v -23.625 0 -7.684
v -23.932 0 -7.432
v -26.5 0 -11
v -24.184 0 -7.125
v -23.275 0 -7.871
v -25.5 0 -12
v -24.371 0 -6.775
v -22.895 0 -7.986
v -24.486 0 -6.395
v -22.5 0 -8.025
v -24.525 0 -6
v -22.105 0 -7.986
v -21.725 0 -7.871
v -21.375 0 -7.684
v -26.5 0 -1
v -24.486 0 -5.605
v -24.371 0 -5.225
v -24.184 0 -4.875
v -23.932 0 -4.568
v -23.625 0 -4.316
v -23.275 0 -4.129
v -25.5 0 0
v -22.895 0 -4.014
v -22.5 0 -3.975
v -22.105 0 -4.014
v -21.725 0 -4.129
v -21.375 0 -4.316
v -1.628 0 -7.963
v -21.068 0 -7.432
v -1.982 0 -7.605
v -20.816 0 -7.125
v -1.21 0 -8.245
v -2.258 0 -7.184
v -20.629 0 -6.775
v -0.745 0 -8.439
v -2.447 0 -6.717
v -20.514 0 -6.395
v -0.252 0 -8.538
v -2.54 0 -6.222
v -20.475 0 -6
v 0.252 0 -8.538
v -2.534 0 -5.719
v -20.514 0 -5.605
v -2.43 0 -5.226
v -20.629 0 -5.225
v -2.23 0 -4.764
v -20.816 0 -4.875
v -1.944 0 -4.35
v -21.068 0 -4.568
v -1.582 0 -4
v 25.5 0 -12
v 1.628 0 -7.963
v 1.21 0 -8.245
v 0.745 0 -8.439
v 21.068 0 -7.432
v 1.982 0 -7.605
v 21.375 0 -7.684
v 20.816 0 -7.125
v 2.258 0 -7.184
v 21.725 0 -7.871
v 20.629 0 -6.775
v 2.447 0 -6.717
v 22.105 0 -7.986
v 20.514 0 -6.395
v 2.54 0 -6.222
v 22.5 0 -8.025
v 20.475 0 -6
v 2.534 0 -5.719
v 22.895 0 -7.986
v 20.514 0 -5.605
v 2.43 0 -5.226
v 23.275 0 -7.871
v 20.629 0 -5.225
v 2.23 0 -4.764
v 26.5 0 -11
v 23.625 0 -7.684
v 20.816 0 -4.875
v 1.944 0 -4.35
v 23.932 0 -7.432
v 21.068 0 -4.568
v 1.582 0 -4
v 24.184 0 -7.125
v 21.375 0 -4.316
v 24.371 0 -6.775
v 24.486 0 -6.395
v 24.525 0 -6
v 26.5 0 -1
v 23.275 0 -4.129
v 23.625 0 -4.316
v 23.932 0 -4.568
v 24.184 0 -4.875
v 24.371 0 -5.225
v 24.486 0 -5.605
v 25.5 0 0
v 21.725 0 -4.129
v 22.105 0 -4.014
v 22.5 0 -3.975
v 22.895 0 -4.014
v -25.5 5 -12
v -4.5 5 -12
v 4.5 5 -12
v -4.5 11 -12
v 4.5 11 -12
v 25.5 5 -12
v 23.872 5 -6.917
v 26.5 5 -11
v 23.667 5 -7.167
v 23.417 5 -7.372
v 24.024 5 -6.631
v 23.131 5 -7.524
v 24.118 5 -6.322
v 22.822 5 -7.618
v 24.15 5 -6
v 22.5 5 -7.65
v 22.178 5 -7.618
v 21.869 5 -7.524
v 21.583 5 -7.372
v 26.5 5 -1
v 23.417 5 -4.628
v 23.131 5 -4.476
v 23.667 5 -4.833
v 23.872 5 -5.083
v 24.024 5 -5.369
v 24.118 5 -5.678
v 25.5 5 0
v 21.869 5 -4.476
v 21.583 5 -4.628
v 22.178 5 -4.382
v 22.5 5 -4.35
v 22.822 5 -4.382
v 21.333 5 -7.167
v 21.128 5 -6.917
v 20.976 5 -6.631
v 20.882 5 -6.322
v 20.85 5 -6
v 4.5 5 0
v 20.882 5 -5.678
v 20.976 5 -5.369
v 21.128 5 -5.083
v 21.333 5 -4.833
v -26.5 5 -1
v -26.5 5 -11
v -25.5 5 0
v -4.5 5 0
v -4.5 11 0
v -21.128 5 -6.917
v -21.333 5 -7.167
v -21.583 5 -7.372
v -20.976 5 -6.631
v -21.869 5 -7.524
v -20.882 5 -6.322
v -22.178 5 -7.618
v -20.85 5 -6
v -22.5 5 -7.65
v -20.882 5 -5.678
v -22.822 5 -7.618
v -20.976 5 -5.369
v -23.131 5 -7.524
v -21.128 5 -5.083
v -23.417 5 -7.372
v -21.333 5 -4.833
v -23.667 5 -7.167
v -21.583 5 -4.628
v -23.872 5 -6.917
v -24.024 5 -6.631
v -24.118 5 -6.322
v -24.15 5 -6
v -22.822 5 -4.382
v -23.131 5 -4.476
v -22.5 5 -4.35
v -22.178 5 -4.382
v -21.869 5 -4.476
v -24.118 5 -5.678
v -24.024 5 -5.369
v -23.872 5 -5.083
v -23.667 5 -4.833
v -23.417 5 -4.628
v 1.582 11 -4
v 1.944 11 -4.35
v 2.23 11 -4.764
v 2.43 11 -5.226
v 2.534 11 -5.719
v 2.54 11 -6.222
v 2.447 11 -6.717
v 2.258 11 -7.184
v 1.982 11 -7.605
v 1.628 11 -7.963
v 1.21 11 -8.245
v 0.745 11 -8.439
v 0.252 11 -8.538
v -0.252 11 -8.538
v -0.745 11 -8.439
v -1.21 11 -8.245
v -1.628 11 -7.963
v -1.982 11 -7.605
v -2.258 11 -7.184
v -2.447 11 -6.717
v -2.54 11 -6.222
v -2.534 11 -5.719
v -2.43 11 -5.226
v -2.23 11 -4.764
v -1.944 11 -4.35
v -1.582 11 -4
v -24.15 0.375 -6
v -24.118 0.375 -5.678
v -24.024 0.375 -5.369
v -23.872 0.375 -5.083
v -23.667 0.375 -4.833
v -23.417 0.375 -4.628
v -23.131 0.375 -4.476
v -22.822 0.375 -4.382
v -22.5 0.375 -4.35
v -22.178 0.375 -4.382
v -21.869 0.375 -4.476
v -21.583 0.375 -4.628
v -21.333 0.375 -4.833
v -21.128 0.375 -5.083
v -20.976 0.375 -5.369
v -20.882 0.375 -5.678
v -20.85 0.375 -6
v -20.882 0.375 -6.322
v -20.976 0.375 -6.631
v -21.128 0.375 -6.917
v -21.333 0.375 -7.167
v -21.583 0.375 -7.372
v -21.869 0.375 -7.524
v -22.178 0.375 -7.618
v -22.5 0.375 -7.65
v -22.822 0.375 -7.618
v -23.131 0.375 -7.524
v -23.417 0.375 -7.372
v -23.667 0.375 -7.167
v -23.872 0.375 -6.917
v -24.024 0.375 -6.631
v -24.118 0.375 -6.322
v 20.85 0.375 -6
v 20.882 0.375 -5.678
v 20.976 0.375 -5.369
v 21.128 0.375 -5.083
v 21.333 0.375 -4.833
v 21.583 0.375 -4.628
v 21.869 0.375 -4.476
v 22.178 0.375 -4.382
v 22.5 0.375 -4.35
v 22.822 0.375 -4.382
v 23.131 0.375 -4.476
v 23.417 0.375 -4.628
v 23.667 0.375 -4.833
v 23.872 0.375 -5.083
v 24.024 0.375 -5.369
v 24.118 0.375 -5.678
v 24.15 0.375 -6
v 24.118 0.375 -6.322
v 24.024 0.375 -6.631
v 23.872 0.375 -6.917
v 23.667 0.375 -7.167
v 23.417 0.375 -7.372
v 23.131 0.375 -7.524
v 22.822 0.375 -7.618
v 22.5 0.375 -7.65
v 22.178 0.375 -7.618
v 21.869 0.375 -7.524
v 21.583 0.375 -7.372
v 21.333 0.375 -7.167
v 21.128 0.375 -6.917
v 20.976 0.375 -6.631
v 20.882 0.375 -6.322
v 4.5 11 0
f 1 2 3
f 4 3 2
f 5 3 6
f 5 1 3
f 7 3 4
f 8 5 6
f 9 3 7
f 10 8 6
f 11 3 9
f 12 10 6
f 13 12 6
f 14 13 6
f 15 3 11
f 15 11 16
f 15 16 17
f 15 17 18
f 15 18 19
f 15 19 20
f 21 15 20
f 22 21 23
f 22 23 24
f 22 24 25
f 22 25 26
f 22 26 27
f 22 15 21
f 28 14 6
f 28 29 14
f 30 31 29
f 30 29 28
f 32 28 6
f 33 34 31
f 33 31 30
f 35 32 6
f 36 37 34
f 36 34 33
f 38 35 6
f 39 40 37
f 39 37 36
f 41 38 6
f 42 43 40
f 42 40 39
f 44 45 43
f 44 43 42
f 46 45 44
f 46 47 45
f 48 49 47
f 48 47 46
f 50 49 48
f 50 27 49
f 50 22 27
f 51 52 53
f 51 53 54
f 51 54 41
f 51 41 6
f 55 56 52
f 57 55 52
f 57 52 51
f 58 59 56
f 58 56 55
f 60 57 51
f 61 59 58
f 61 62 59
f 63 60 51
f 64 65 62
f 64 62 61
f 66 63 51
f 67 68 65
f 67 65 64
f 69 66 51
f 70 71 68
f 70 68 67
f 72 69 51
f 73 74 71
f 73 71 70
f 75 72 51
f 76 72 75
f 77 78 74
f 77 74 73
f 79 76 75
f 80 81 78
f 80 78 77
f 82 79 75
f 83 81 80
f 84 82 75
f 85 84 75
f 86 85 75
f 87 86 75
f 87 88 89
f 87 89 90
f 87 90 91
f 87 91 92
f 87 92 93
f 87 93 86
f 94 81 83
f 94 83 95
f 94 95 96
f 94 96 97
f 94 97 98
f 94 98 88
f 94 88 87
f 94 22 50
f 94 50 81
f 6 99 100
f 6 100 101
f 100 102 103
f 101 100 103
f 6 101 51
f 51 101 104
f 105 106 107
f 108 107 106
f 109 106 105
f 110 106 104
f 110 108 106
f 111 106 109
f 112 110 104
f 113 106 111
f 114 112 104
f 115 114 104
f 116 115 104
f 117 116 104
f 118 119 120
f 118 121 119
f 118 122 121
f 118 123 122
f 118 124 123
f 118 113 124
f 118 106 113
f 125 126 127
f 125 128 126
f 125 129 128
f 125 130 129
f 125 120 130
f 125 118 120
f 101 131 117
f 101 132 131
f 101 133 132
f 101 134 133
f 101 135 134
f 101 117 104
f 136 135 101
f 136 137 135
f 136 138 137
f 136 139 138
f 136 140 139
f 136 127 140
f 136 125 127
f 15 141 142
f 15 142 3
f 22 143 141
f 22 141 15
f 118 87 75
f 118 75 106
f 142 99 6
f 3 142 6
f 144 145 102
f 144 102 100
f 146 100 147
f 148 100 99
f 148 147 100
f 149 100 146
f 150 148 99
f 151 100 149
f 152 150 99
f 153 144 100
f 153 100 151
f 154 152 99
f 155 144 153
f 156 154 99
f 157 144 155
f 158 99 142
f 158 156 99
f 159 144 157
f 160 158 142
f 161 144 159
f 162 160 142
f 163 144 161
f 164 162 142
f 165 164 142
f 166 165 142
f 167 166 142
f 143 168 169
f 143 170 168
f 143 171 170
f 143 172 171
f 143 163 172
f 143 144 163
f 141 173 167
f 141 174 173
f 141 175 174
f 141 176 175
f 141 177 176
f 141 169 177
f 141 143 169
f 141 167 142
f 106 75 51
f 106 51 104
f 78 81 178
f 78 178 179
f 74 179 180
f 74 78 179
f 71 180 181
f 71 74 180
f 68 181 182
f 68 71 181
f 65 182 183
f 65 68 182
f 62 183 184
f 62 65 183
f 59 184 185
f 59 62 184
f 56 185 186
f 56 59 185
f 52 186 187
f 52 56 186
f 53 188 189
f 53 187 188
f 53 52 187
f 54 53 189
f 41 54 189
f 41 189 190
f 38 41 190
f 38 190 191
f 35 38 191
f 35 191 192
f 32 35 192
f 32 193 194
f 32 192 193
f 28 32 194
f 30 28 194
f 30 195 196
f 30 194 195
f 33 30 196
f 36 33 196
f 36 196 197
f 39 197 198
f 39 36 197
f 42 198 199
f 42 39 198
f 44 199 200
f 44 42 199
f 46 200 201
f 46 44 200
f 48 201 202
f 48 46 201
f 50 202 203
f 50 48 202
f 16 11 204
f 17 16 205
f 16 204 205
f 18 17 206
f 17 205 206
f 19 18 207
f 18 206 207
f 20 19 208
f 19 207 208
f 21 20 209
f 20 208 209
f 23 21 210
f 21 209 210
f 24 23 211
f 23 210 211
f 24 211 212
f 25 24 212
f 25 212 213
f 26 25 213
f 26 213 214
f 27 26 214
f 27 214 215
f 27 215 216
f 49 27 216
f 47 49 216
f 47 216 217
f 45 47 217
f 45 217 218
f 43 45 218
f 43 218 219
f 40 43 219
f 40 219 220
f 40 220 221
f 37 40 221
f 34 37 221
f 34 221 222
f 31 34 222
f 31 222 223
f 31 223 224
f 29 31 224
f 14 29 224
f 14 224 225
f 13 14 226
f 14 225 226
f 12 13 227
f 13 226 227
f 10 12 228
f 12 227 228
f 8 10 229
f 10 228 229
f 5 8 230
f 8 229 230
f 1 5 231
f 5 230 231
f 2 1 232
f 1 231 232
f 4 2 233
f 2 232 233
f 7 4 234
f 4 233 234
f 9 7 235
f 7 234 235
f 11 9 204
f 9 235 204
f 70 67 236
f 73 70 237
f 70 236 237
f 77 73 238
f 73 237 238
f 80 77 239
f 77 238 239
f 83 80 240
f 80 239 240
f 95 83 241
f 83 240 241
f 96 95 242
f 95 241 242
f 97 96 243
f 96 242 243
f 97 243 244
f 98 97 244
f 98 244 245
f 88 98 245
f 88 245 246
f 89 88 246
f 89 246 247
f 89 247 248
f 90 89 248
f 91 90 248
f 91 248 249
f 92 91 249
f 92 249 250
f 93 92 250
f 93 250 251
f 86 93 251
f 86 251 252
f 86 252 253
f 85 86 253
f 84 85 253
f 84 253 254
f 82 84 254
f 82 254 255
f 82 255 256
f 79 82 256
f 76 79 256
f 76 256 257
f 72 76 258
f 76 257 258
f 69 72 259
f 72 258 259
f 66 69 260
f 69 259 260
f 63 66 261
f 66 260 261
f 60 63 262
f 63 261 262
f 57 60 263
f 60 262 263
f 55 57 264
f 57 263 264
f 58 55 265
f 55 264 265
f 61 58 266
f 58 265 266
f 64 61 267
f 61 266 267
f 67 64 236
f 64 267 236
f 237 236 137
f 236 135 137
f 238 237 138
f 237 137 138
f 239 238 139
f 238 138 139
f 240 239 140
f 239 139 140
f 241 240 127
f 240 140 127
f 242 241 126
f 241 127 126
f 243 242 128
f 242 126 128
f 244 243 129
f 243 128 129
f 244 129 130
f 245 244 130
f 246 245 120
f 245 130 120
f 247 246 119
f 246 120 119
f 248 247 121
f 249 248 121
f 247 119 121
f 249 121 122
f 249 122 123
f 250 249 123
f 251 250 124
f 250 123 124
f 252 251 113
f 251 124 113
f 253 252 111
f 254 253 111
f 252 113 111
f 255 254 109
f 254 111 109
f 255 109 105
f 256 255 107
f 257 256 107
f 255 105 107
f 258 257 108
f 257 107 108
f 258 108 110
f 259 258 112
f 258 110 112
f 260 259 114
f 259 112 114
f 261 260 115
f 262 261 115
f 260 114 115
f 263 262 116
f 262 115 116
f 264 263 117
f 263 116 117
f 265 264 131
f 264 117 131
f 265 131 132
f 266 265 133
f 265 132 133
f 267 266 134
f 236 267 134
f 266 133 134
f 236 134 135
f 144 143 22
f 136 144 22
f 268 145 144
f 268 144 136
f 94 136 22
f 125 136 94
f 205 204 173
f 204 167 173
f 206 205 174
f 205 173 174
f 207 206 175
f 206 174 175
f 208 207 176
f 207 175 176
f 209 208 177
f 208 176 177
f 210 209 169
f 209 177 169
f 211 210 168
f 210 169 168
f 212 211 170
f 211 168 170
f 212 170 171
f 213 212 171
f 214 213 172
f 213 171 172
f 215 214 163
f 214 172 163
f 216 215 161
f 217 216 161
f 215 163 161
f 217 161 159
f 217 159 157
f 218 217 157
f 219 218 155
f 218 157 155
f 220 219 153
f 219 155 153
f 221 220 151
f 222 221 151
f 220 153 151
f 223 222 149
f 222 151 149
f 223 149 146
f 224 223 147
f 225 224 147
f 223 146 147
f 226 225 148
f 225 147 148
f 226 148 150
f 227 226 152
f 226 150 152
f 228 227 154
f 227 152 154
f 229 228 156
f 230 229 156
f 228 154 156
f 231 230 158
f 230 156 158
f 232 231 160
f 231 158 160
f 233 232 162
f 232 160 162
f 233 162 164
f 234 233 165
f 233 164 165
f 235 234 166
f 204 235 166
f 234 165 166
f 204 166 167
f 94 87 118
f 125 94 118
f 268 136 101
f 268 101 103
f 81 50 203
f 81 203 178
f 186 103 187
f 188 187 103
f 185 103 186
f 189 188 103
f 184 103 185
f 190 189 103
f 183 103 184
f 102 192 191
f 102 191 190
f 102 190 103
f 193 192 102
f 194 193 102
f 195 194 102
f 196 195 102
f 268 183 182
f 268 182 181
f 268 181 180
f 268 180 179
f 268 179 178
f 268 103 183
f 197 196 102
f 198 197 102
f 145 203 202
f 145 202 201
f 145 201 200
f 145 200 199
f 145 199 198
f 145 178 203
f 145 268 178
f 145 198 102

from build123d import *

# Parameters (mm, degrees)
BODY_EXTRUDE_DEPTH              = 12
M4X0_7_TAPPED_HOLE6_D           = 3.3
M4X0_7_TAPPED_HOLE6_CSINK_D     = 4.05
M4X0_7_TAPPED_HOLE6_CSINK_ANGLE = 90
CUT_EXTRUDE1_DEPTH              = 32.10064308
CHAMFER1_SIZE                   = 1


with BuildPart() as part:
    # Sketch1 → Body Extrude (new body)
    with BuildSketch(Plane.XY):
        Polygon((-26.5, 0), (26.5, 0), (26.5, 5), (4.5, 5), (4.5, 11), (-4.5, 11), (-4.5, 5), (-26.5, 5), align=None)
    extrude(amount=-BODY_EXTRUDE_DEPTH)

    # M4x0.7 Tapped Hole6 (through all)
    with Locations(Plane.XZ):
        with Locations((-22.5, -6), (22.5, -6)):
            CounterSinkHole(M4X0_7_TAPPED_HOLE6_D / 2, M4X0_7_TAPPED_HOLE6_CSINK_D / 2, counter_sink_angle=M4X0_7_TAPPED_HOLE6_CSINK_ANGLE)

    # Sketch2 → Cut-Extrude1 (cut, through all)
    with BuildSketch(Plane(origin=(0, 0, 0), x_dir=(1, 0, 0), z_dir=(0, 1, 0))):
        with BuildLine():
            Line((-1.581929202, 4), (1.581929202, 4))
            ThreePointArc((1.581929202, 4), (0, 8.55), (-1.581929202, 4))
        make_face()
    extrude(amount=CUT_EXTRUDE1_DEPTH, mode=Mode.SUBTRACT)

    # Chamfer1
    chamfer1_edges = [part.edges().sort_by_distance(p)[0] for p in [
        (26.5, 2.5, 0),
        (-26.5, 2.5, 0),
        (26.5, 2.5, -12),
        (-26.5, 2.5, -12),
    ]]
    chamfer(chamfer1_edges, length=CHAMFER1_SIZE)


solid = part.part
